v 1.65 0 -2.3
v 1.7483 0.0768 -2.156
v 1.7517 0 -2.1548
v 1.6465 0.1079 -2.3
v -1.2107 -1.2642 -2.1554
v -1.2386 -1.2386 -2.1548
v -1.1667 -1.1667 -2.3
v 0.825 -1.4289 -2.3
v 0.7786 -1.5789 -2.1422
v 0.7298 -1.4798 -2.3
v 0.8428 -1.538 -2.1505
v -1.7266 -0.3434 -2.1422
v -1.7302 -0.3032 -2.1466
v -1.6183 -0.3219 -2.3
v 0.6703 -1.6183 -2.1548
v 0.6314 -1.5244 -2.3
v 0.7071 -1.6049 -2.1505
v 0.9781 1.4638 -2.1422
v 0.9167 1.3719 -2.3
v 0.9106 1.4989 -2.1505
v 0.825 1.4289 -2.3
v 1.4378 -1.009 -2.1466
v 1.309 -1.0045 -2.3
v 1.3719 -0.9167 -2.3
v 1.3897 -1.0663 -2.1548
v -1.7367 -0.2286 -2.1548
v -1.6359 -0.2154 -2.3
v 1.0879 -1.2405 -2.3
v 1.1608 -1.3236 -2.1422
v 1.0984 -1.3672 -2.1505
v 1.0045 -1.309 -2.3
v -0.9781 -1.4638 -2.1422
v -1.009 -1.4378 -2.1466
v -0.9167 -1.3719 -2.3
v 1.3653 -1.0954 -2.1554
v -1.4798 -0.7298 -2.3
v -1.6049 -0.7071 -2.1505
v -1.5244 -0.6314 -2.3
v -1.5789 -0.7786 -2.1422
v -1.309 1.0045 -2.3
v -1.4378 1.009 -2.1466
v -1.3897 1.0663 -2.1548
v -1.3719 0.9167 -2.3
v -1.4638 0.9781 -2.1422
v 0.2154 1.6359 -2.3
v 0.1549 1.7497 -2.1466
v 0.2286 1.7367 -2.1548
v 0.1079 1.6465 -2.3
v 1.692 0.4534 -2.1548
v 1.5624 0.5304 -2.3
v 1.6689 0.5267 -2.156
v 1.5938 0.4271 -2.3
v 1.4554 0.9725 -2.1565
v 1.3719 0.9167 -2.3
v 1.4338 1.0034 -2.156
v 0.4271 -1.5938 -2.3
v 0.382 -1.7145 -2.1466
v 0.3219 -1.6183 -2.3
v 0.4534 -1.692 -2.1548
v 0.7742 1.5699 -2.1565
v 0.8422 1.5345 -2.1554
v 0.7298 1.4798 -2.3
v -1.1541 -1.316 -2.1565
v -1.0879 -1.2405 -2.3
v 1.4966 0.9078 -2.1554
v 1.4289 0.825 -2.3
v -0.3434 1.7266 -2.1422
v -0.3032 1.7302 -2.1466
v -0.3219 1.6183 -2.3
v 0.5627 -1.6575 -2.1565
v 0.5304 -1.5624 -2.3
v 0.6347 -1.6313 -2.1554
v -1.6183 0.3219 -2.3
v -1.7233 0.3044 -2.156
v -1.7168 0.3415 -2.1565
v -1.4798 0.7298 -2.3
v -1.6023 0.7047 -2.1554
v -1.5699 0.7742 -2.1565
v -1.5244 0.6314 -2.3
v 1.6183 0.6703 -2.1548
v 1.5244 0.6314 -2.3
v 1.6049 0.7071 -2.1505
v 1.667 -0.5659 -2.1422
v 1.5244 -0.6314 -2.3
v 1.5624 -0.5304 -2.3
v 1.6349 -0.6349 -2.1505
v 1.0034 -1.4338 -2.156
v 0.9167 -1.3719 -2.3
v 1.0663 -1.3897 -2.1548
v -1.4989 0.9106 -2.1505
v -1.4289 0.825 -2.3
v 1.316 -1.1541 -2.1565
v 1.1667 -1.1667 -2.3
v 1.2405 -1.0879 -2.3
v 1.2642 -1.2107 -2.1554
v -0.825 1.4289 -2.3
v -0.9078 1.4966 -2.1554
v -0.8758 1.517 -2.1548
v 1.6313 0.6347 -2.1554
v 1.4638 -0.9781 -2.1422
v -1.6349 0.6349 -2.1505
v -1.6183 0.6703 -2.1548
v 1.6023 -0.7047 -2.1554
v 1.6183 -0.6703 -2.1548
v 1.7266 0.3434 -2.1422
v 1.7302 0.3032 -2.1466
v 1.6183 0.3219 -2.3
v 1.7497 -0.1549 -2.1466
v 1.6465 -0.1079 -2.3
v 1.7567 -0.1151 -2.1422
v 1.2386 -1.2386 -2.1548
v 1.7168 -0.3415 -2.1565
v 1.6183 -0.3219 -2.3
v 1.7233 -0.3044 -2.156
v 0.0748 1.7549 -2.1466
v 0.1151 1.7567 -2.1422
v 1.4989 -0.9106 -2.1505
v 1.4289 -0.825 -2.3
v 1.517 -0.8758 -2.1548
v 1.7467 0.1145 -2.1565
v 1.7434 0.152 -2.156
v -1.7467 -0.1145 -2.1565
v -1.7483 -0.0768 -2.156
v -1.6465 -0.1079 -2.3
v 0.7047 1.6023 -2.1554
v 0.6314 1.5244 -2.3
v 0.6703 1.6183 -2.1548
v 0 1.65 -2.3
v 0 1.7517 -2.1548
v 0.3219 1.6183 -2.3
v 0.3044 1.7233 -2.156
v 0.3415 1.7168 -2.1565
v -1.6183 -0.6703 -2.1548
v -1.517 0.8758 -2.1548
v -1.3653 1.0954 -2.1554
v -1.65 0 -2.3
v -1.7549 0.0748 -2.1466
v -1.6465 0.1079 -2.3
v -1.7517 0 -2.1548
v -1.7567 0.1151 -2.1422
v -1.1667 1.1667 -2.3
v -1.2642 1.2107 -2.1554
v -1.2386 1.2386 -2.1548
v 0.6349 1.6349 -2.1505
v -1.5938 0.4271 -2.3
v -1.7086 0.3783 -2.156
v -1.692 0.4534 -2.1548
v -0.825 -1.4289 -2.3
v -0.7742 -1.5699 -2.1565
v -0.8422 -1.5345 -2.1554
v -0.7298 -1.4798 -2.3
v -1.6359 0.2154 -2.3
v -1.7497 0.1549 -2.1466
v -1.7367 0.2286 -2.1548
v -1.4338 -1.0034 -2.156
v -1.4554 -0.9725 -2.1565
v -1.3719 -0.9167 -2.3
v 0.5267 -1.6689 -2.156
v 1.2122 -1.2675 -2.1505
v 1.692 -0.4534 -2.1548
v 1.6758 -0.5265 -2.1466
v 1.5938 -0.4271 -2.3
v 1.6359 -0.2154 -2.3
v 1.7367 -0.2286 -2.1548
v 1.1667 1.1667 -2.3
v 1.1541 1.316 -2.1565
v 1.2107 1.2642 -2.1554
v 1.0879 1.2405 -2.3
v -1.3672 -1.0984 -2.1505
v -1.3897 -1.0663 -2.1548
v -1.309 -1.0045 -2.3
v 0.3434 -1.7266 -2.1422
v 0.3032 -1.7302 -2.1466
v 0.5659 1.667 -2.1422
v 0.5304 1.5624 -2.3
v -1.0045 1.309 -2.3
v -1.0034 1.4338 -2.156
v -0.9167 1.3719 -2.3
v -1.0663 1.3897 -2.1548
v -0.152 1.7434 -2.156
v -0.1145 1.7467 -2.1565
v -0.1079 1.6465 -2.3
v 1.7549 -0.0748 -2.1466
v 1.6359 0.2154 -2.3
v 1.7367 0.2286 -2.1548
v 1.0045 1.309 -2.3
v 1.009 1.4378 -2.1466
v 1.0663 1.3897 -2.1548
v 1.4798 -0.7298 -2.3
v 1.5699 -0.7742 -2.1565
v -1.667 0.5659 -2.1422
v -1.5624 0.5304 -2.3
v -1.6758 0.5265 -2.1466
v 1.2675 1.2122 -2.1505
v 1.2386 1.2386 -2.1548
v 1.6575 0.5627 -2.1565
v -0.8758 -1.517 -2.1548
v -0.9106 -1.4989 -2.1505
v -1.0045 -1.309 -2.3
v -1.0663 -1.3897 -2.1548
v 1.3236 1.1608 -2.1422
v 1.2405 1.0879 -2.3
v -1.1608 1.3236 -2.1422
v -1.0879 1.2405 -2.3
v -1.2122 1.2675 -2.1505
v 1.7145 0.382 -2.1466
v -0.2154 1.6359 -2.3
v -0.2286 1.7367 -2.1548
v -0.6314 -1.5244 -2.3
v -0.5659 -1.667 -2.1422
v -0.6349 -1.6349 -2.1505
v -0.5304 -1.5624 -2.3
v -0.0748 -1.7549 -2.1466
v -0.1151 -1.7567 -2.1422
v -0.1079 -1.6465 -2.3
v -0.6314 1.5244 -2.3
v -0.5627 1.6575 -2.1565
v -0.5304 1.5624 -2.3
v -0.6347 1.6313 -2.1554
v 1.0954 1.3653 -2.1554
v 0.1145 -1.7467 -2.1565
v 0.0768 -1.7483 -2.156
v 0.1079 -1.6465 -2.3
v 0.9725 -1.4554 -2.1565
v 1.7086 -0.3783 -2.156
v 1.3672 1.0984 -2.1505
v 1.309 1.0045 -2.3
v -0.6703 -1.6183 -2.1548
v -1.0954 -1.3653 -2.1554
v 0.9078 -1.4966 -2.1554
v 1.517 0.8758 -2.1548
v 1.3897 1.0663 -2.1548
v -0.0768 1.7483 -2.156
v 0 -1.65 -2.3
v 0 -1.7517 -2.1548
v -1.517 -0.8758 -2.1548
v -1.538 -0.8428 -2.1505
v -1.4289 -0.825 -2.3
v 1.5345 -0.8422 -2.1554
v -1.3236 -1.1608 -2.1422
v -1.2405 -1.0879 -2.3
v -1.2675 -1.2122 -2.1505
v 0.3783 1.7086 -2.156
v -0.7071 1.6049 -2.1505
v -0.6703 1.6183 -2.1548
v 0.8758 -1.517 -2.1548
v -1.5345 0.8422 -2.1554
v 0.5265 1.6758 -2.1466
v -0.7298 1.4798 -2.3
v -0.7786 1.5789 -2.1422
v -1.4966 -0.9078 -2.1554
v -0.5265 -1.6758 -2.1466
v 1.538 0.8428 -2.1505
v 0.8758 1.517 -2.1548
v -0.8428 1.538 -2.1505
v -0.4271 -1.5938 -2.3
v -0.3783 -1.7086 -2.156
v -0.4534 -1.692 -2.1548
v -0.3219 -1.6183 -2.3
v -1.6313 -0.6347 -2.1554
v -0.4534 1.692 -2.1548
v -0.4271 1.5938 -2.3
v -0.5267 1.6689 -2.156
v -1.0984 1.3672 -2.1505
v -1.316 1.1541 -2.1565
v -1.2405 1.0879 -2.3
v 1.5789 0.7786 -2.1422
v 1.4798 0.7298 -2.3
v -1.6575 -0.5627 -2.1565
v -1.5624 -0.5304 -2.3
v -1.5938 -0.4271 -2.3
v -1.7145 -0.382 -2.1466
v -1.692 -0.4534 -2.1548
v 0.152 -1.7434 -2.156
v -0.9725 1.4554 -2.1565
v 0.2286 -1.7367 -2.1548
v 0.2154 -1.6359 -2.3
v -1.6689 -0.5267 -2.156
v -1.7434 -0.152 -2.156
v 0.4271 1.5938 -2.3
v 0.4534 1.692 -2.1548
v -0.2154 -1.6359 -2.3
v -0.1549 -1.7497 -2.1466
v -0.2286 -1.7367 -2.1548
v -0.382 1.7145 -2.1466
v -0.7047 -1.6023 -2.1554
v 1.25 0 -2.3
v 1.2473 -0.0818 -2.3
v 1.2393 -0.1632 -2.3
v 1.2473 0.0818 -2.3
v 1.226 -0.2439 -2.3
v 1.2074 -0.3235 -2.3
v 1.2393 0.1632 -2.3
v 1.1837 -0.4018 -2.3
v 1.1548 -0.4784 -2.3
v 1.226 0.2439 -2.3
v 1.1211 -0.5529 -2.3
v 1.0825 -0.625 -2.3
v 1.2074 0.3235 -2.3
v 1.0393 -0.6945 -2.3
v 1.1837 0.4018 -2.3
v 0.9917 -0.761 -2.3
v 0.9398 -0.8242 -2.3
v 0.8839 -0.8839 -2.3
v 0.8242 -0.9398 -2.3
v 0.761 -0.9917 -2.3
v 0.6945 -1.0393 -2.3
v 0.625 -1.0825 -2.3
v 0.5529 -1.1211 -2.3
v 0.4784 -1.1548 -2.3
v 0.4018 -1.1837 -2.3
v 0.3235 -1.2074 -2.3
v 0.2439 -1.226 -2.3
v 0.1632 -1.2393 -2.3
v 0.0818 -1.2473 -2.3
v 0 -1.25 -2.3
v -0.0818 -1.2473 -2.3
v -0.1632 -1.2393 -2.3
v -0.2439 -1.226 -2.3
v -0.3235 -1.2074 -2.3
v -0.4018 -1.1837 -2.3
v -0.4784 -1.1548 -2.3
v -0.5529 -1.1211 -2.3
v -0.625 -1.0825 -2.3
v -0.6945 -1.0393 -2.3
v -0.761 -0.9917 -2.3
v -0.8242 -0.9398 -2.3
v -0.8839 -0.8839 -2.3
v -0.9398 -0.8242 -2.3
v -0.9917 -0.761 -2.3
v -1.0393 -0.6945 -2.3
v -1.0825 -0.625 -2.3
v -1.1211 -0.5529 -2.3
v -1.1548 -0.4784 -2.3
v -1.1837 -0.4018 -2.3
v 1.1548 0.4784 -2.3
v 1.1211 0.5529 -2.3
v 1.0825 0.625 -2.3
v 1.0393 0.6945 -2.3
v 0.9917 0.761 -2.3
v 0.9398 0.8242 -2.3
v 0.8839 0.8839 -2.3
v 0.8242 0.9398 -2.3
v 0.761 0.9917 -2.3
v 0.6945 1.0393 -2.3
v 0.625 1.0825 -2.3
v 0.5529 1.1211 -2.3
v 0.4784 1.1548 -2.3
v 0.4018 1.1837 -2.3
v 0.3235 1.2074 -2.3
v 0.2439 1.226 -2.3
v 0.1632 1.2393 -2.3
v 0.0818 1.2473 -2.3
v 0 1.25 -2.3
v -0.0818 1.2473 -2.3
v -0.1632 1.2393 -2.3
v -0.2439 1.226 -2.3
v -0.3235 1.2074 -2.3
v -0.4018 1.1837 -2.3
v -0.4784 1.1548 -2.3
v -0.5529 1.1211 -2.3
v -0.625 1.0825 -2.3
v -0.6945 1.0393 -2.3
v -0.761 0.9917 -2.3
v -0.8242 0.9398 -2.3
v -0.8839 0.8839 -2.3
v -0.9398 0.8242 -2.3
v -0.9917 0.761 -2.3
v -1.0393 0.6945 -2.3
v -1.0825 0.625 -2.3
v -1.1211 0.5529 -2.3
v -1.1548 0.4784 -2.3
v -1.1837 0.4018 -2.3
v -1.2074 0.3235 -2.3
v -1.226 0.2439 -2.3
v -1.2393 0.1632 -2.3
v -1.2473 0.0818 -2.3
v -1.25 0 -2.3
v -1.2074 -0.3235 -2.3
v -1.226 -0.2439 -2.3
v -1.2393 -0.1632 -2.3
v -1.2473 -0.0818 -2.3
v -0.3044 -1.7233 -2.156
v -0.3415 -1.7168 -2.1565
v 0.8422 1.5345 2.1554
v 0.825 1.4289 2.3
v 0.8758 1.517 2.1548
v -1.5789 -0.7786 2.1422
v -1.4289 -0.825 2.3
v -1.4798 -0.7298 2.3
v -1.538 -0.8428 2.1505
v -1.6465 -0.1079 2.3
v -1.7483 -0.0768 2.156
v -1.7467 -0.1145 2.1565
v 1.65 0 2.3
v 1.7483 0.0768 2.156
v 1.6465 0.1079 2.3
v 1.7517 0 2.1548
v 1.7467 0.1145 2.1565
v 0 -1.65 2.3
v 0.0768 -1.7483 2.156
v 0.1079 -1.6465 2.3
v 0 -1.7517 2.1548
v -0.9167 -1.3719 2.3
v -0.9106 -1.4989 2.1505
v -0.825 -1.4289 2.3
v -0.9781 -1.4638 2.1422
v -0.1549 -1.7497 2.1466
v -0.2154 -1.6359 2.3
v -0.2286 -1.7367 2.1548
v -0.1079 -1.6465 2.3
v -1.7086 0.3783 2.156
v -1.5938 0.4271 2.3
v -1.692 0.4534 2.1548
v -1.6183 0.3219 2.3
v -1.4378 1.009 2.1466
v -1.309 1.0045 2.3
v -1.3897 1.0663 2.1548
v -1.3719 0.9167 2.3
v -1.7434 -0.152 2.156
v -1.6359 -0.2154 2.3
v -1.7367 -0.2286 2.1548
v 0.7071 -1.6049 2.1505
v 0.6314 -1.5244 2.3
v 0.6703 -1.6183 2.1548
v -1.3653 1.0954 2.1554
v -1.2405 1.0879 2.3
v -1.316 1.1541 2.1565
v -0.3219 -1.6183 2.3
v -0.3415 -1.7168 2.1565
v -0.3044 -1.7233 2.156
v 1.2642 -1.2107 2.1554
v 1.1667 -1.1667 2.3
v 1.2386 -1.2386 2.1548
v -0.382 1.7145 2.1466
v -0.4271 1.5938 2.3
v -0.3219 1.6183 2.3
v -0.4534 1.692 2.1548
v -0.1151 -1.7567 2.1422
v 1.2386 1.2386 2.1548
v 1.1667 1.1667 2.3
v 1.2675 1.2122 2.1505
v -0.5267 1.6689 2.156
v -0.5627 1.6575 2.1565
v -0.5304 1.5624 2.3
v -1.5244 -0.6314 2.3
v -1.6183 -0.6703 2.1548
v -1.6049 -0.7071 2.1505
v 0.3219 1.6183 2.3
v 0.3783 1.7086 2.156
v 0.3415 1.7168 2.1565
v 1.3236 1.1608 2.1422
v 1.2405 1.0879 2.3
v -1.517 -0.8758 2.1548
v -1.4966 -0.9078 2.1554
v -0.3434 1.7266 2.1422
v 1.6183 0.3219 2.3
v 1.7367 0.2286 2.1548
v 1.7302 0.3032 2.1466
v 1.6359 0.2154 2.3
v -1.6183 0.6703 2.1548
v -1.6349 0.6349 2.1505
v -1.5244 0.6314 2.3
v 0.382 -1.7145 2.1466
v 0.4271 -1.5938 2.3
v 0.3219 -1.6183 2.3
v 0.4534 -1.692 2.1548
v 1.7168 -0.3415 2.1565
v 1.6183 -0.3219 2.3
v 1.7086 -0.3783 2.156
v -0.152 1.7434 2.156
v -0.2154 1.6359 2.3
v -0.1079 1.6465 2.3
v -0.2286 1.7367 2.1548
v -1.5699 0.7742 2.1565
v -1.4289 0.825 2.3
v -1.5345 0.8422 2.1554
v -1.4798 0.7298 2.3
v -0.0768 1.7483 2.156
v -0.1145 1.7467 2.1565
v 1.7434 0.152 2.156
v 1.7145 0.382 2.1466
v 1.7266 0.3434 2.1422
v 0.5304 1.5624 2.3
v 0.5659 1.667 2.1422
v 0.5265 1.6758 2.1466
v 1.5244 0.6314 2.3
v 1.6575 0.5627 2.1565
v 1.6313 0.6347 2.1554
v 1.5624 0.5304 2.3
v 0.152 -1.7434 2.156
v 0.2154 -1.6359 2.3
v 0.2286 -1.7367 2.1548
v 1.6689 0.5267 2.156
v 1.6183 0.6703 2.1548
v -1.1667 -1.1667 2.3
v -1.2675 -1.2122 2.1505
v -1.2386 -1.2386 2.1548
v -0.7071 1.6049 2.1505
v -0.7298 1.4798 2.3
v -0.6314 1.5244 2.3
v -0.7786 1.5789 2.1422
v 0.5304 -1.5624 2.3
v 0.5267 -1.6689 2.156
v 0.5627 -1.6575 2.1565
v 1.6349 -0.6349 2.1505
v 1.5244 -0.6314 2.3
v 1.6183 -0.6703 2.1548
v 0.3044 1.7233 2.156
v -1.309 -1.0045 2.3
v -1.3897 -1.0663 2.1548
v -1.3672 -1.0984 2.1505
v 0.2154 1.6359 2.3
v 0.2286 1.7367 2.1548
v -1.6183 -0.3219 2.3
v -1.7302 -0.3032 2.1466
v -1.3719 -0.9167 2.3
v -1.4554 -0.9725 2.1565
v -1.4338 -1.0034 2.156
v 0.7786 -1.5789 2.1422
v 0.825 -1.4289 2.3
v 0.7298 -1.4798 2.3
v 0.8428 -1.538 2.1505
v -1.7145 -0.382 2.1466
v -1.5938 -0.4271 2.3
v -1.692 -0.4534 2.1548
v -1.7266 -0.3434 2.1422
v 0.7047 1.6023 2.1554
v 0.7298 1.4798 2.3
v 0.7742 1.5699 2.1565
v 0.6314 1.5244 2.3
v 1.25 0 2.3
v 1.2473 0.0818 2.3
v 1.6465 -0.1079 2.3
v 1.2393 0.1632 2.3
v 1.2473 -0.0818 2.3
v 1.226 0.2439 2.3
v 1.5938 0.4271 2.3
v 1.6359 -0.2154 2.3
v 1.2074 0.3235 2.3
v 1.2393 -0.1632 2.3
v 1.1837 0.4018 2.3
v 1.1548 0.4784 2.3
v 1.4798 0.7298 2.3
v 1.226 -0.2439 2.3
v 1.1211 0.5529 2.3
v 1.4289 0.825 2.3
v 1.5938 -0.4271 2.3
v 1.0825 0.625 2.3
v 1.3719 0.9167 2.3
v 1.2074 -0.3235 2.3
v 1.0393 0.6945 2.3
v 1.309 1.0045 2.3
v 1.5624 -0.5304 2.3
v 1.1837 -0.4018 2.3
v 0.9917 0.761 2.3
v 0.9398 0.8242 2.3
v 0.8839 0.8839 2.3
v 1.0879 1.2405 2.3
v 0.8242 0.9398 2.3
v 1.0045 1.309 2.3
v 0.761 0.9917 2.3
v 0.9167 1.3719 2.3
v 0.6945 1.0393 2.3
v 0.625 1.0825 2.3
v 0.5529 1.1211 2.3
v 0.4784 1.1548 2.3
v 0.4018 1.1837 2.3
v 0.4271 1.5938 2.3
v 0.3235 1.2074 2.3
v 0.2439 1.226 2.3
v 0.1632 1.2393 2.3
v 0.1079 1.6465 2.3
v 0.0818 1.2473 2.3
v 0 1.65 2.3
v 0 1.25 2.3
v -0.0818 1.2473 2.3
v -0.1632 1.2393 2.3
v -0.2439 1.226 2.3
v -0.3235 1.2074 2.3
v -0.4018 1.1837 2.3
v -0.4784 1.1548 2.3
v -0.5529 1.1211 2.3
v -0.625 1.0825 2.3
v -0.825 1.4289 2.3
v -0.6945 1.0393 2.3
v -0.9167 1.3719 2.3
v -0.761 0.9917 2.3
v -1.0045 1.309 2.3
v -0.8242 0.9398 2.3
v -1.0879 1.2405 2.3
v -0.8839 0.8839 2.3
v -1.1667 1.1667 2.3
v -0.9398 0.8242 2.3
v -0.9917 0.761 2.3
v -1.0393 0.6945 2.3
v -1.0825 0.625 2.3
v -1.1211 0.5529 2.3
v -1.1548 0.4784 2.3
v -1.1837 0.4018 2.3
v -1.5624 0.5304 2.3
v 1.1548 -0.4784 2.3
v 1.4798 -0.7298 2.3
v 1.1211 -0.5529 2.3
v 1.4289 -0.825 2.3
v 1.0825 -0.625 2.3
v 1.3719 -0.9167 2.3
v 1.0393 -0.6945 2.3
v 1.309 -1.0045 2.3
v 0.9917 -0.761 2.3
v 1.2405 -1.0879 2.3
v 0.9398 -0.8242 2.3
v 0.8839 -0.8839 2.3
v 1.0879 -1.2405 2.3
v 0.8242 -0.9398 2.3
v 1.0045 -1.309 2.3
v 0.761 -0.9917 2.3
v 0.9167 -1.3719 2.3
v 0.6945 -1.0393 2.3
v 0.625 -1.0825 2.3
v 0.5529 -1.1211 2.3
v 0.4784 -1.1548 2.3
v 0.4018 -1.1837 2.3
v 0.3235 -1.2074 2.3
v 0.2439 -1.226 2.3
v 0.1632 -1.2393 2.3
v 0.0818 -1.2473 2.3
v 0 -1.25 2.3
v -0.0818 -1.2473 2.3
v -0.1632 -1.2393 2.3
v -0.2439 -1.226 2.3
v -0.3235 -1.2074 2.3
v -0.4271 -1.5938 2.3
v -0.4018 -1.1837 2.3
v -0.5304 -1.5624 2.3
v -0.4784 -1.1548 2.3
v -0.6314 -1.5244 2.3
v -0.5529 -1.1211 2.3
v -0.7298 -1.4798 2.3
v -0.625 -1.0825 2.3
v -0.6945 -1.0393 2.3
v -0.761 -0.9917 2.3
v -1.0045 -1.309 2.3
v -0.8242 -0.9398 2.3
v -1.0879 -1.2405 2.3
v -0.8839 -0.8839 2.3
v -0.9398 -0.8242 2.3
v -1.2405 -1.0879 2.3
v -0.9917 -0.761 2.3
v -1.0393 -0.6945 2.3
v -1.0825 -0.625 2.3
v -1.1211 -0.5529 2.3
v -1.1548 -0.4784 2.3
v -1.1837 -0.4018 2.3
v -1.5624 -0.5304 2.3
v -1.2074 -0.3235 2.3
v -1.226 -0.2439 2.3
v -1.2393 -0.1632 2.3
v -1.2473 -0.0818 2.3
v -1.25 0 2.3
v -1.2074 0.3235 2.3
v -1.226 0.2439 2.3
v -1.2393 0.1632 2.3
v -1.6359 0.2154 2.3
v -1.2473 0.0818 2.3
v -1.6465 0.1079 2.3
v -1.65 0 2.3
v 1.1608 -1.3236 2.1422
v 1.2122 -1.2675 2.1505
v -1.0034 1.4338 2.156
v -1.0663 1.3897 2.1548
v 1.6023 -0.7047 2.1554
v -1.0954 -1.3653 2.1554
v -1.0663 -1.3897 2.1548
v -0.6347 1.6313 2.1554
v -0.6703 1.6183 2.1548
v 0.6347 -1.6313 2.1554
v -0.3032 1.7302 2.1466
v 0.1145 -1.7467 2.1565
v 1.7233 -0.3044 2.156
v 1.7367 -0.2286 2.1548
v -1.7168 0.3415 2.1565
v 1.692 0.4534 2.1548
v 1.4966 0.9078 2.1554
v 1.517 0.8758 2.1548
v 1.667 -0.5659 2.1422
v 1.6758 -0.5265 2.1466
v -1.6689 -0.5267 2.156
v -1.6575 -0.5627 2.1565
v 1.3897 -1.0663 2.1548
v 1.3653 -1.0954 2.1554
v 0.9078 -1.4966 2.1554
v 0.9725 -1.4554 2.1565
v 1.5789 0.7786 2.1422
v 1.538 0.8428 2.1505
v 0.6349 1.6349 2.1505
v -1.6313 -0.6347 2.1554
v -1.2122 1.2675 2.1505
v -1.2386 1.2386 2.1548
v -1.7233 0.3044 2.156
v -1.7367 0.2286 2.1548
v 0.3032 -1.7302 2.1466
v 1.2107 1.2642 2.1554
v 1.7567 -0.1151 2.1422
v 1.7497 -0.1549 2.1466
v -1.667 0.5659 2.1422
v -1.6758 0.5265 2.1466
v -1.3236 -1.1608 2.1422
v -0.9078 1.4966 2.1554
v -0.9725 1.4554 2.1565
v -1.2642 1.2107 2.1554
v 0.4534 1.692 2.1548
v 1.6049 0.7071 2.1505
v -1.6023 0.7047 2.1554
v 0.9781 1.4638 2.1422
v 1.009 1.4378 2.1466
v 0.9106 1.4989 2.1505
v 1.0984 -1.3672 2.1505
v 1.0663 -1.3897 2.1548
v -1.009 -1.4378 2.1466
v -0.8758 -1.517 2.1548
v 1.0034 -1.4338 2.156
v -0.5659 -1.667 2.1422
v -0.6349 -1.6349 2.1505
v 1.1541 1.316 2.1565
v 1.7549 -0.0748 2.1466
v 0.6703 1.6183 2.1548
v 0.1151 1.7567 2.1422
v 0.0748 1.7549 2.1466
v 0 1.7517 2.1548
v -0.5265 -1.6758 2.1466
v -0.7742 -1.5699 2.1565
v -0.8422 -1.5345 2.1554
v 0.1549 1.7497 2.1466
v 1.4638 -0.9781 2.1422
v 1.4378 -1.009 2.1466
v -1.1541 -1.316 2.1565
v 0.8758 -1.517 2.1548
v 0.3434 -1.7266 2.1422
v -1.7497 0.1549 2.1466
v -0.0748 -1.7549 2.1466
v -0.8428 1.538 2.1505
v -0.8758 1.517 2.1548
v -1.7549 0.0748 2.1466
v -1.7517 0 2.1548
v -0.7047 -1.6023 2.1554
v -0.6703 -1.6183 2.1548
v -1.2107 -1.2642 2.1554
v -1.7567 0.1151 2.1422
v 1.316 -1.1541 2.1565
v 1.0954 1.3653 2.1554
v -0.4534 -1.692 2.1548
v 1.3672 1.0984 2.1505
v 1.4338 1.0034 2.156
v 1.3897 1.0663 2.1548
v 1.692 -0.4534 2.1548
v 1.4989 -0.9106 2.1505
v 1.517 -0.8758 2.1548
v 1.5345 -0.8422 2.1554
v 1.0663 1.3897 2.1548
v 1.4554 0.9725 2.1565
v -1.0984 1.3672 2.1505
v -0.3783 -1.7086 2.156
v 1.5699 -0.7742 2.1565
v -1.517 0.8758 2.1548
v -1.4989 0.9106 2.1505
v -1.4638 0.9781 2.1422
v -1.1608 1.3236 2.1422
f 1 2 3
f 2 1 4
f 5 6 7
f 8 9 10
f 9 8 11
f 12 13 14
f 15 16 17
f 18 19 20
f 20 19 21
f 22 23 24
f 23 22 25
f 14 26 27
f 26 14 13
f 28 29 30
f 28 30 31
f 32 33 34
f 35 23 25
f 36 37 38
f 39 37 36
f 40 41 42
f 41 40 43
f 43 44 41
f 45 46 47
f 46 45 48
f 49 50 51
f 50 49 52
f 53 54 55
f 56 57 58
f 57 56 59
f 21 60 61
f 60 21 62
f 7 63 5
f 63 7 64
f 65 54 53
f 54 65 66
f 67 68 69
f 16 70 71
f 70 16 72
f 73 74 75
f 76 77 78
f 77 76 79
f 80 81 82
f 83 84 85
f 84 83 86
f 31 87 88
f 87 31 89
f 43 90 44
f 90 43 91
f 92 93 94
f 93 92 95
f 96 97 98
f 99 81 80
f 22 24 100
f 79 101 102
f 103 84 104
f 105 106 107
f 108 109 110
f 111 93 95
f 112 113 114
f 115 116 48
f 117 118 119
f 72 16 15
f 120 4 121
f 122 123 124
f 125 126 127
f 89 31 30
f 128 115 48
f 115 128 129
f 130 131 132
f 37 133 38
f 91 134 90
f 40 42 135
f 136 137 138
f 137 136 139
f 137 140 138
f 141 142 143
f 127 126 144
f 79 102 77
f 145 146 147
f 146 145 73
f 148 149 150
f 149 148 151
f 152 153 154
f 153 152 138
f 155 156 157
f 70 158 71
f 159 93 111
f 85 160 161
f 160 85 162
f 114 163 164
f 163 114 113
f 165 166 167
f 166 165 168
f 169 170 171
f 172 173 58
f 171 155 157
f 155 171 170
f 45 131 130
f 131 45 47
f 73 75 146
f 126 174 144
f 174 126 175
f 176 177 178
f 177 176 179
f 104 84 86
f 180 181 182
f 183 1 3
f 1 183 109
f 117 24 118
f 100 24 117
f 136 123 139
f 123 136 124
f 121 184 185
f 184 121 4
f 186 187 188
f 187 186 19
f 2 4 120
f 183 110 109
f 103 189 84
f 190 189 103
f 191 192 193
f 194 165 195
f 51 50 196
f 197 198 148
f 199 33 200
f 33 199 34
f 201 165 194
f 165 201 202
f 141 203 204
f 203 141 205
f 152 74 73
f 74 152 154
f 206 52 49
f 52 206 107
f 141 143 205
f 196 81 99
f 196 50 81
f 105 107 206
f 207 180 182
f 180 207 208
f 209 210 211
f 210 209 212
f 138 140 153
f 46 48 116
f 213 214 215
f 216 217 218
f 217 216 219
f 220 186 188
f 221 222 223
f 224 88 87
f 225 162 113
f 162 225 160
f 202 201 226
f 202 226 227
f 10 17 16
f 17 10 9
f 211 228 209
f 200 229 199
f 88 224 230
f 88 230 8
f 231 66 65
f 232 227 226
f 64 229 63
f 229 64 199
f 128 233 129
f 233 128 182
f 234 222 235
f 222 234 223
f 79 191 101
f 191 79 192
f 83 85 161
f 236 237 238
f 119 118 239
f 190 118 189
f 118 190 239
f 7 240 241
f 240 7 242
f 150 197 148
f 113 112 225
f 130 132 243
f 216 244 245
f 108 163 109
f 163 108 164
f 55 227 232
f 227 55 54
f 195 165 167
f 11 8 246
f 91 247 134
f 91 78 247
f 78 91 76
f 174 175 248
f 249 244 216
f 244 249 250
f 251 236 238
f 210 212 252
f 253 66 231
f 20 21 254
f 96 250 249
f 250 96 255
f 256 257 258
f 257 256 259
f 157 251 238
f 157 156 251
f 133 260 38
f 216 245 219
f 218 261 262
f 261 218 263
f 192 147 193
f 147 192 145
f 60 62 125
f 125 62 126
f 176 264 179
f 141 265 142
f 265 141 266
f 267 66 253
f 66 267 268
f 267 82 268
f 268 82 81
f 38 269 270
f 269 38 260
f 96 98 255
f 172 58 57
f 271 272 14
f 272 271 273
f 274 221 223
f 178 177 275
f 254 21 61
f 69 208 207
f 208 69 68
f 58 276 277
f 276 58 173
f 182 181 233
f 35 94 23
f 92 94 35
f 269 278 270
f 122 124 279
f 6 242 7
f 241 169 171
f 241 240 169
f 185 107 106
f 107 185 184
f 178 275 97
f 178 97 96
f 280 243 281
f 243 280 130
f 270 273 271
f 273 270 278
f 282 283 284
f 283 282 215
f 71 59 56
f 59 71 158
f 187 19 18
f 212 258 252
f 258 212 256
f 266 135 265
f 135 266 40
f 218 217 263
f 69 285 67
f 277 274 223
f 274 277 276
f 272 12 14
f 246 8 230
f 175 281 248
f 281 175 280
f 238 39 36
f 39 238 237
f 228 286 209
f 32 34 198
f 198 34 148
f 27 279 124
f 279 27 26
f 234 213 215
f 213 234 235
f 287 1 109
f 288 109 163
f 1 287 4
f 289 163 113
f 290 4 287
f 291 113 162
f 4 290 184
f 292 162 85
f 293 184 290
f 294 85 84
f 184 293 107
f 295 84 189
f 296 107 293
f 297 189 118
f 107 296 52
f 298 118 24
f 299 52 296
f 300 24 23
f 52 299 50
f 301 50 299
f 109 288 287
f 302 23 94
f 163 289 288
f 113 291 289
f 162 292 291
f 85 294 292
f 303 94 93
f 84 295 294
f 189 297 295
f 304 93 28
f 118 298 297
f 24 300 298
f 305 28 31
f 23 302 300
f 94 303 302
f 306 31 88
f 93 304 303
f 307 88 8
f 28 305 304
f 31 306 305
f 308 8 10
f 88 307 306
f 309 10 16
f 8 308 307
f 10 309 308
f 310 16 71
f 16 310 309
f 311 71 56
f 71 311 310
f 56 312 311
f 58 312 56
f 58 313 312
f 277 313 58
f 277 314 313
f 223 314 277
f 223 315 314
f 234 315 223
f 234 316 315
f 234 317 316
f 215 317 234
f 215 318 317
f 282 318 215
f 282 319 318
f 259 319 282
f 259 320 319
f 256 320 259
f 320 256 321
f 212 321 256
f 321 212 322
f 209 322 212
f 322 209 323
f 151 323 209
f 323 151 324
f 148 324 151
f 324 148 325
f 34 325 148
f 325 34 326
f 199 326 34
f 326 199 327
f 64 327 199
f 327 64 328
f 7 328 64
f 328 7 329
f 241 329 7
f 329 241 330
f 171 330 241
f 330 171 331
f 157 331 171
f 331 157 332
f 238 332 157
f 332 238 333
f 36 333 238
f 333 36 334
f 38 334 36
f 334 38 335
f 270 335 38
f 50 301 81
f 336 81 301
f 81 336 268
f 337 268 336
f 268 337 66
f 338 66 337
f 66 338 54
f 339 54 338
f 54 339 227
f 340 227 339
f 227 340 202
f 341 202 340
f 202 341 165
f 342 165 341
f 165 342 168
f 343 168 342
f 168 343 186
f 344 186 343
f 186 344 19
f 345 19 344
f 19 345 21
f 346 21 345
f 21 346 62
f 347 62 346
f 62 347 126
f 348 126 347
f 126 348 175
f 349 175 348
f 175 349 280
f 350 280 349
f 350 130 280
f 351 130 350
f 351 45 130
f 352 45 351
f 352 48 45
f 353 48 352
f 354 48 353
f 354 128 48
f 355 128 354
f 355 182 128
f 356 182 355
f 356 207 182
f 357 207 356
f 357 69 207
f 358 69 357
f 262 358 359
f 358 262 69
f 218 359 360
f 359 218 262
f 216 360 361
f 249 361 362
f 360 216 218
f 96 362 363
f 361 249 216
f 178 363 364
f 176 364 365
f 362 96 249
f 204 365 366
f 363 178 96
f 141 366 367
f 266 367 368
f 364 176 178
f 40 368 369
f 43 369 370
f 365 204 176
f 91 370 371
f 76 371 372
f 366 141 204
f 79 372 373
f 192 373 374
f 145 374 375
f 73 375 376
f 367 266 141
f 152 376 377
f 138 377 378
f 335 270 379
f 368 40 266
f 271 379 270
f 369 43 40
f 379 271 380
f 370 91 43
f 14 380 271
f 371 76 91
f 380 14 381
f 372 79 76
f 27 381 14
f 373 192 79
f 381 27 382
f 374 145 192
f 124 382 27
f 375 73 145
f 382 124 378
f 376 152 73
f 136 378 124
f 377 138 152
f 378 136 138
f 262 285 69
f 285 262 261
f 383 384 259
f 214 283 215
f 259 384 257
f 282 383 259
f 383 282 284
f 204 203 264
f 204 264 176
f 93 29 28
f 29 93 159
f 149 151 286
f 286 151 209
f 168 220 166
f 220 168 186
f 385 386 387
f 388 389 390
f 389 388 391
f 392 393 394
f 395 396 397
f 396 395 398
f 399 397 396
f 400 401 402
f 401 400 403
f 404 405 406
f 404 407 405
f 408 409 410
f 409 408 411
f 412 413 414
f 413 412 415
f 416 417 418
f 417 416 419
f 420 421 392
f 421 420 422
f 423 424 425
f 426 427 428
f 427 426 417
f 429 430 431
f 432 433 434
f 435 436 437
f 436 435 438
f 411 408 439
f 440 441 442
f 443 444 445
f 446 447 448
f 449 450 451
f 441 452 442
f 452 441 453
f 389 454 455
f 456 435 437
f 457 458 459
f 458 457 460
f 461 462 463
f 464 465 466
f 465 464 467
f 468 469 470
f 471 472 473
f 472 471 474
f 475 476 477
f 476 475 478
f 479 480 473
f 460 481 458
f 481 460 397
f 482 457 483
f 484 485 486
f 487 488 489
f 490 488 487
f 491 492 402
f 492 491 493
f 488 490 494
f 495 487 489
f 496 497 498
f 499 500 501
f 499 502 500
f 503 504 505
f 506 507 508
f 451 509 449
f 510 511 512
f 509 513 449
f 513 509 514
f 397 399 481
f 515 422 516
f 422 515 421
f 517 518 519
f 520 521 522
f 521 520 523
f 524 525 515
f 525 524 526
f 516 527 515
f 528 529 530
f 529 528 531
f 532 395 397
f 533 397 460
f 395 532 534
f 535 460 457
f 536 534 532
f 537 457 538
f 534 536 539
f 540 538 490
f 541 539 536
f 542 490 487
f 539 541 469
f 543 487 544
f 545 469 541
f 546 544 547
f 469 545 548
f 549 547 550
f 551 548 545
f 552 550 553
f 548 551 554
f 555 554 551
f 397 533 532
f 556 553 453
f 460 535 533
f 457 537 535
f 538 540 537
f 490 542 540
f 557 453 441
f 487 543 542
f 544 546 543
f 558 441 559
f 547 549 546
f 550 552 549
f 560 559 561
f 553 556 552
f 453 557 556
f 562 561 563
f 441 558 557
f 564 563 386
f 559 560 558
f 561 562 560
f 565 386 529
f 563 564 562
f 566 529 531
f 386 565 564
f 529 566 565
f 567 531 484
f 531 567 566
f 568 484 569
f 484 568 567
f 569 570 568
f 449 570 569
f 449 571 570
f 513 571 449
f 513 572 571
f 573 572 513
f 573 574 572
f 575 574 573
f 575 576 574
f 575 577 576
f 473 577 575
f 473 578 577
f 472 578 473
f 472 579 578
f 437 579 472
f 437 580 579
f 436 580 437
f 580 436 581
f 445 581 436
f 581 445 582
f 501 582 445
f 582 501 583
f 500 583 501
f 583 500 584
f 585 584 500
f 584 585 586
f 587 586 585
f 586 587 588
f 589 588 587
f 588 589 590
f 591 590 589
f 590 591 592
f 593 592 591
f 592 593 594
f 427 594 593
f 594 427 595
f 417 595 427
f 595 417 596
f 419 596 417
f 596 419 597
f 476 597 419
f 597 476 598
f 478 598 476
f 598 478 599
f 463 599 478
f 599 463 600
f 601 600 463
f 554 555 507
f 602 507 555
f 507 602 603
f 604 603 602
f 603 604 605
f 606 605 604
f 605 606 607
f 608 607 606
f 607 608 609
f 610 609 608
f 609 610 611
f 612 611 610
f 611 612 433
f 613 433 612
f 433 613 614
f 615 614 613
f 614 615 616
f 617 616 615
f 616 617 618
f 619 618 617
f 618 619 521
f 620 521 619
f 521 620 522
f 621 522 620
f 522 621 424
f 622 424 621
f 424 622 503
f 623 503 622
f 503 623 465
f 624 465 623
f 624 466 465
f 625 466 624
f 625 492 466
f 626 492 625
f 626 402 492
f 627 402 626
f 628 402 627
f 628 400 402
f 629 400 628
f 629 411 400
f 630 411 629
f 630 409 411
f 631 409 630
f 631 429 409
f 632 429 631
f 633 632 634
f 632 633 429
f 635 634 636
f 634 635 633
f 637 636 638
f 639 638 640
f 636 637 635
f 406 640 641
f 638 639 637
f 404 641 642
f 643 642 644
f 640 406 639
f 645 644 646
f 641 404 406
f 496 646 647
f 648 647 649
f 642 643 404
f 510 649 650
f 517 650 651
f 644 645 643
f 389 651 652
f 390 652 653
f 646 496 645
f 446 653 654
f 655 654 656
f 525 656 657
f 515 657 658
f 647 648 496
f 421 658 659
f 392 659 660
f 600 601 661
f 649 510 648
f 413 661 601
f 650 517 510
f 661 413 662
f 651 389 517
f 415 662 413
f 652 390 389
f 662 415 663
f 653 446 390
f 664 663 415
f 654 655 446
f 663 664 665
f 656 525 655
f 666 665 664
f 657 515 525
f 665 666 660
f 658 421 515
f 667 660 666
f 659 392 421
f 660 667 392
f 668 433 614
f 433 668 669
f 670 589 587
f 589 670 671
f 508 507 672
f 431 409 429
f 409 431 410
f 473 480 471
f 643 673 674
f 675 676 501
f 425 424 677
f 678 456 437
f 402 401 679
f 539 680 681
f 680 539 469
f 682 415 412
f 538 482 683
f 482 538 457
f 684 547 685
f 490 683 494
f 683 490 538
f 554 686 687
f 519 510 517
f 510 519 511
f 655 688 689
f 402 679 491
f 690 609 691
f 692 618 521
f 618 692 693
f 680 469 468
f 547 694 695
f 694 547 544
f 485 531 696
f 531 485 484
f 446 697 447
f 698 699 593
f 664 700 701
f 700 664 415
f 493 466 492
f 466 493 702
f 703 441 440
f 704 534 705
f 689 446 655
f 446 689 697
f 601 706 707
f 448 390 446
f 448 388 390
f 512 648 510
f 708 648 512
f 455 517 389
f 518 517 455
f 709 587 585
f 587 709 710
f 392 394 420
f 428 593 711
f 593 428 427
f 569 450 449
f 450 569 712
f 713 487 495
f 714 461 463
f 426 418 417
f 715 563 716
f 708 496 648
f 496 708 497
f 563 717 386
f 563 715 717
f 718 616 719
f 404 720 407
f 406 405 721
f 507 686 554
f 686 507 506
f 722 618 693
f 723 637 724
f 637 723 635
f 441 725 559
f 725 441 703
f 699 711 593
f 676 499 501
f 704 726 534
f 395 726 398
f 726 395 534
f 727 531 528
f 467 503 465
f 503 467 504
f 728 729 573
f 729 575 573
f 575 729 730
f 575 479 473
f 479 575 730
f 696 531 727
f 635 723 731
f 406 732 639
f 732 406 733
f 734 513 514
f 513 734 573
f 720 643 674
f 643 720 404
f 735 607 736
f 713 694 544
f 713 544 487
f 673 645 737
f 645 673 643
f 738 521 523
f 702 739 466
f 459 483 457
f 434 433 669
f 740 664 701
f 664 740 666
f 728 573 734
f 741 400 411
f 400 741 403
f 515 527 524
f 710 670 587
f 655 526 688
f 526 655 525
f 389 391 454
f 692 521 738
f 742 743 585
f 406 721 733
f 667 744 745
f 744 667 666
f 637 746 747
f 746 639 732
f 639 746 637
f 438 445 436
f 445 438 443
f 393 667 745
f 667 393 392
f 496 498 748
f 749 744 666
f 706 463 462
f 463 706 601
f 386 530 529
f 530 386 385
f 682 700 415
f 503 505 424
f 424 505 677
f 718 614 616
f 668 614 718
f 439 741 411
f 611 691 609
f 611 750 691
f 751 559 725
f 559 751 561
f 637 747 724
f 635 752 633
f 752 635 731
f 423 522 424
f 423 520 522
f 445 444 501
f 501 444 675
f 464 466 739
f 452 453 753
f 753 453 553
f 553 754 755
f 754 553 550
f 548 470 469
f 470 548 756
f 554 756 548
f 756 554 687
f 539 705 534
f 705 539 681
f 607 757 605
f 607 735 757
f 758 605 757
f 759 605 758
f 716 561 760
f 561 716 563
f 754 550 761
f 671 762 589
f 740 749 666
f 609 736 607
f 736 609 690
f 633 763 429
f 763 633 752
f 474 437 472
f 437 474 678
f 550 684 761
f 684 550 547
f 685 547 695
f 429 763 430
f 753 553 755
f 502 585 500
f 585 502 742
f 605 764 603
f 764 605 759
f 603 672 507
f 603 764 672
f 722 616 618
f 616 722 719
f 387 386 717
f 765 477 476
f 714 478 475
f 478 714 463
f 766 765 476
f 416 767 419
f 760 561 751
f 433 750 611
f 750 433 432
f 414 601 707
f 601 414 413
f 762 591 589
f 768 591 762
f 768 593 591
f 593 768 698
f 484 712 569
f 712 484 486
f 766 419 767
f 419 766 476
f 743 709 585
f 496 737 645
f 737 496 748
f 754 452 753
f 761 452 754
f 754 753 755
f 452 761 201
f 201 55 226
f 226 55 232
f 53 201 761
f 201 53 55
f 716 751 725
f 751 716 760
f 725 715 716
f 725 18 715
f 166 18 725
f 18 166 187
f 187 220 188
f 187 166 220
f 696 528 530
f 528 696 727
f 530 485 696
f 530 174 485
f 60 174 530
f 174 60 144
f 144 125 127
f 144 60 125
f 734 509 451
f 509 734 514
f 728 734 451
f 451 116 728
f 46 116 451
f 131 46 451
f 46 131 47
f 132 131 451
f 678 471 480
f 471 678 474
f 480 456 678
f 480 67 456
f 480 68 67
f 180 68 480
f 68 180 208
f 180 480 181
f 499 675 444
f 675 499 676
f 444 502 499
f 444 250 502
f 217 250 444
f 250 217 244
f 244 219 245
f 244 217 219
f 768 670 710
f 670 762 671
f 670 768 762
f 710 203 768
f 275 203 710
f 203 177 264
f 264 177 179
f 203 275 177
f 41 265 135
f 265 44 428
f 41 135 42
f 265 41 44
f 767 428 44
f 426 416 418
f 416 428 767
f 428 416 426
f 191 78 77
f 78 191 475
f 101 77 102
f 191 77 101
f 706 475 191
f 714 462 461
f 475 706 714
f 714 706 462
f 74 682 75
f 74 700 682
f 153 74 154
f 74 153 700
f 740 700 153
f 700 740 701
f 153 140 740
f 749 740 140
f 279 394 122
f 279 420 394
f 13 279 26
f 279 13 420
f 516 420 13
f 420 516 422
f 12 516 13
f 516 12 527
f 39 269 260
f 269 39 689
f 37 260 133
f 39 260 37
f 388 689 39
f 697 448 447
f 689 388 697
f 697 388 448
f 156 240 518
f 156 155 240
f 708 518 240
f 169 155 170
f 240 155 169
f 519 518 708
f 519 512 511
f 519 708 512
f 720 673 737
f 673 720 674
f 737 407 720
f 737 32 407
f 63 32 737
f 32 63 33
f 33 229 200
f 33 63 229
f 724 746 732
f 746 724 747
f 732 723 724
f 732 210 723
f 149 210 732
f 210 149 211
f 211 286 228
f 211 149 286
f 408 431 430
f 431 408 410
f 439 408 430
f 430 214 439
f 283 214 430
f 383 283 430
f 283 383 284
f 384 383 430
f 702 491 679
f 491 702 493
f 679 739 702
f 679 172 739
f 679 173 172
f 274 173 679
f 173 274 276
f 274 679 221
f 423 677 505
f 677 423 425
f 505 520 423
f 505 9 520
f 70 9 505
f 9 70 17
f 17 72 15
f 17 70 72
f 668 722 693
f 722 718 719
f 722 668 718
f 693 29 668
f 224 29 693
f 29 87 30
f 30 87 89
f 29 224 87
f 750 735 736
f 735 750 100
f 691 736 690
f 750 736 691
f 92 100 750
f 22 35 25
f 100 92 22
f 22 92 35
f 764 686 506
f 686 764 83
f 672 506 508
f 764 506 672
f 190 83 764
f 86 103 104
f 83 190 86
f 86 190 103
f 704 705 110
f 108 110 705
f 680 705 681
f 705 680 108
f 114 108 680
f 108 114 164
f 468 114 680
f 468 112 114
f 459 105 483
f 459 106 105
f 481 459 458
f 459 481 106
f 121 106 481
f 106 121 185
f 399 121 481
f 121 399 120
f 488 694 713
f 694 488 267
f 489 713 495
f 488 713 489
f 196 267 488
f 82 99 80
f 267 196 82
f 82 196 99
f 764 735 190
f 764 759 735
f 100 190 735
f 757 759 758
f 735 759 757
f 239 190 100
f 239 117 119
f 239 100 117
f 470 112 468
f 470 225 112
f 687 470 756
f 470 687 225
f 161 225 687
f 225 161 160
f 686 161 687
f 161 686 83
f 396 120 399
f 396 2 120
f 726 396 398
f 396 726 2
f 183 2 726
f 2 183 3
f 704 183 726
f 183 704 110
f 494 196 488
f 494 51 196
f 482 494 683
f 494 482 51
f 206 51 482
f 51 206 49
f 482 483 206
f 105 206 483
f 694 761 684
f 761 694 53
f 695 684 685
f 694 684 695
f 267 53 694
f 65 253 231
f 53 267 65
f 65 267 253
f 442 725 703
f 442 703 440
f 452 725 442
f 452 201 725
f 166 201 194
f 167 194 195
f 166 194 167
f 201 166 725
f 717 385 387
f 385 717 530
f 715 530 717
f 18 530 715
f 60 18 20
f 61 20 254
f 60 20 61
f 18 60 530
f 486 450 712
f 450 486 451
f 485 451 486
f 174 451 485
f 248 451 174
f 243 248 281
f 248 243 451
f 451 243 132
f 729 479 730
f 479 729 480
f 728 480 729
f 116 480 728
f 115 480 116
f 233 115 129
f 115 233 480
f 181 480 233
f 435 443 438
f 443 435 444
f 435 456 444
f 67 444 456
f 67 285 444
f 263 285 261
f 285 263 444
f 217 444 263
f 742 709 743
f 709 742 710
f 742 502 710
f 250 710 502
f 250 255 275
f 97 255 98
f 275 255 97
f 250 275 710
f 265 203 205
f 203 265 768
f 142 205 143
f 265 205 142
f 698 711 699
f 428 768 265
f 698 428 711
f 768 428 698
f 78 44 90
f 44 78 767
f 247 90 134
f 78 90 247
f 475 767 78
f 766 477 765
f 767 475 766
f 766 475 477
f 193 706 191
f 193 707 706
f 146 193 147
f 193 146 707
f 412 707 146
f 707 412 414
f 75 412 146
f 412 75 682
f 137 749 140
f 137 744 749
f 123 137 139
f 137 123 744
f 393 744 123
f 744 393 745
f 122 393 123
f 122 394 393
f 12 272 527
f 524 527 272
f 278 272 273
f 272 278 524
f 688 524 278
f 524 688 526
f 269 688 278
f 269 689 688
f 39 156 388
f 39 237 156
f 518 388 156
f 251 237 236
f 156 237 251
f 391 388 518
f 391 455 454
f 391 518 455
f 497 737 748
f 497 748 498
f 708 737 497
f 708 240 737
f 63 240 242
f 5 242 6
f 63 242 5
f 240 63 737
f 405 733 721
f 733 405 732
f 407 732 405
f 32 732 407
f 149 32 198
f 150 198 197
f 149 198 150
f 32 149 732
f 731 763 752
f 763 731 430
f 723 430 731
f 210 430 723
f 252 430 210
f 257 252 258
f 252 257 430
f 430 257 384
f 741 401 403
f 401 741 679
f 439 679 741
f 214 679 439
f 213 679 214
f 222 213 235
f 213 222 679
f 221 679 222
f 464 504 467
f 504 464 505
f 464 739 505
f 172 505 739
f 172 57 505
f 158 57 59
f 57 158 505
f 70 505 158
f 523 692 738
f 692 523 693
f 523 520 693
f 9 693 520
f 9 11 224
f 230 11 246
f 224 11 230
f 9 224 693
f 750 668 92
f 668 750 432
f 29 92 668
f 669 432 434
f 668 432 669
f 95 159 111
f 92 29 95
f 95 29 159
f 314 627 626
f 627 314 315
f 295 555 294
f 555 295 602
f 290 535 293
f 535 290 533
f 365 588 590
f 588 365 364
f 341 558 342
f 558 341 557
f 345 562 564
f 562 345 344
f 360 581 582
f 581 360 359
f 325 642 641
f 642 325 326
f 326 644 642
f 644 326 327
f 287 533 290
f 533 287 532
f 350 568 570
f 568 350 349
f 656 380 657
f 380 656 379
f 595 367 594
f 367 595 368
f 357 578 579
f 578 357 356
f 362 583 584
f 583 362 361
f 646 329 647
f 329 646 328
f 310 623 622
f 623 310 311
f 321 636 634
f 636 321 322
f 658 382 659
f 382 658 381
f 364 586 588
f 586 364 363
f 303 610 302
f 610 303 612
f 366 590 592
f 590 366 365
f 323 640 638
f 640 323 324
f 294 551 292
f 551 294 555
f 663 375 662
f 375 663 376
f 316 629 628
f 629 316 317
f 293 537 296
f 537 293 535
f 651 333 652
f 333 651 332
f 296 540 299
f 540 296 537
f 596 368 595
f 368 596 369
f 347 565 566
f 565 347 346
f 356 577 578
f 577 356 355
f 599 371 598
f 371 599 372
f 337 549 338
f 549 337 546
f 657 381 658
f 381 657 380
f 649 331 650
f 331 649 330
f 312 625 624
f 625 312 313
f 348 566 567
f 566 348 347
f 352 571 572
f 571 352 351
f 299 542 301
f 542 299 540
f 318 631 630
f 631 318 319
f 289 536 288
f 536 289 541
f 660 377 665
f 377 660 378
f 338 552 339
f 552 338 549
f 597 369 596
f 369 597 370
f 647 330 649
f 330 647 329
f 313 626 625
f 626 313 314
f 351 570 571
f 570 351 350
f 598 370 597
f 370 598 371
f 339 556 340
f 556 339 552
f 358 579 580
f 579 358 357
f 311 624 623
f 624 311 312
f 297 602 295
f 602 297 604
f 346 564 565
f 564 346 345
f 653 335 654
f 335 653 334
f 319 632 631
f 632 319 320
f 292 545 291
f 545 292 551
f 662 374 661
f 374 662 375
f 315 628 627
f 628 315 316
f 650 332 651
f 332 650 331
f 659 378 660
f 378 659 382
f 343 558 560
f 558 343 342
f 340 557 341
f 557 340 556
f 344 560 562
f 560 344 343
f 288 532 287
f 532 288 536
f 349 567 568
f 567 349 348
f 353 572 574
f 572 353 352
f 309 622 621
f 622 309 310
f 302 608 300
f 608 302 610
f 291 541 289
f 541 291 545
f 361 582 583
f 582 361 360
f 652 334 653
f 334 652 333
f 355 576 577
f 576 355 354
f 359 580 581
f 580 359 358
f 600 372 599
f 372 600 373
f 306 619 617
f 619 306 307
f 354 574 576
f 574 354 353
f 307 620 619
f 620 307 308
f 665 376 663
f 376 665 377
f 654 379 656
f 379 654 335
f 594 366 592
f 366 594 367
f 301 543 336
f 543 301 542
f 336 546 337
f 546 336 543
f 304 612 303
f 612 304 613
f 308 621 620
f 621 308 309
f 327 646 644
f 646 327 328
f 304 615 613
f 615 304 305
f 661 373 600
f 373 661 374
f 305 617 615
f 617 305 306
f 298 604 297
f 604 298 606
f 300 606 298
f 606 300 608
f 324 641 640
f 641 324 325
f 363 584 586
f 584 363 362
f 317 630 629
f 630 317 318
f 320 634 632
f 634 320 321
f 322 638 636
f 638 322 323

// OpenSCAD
$fn=96;

od = 4.0;
len = 4.6;
id = 2.5;

knurl_depth = 0.25;
knurl_count = 24;
knurl_twist_deg = 35;

chamfer_h = 0.5;
chamfer_r = 0.35;

module chamfered_cylinder(h, r, ch_h, ch_r) {
    union() {
        translate([0,0,-h/2 + ch_h])
            cylinder(h=h-2*ch_h, r=r, center=false);
        translate([0,0,-h/2])
            cylinder(h=ch_h, r1=r-ch_r, r2=r, center=false);
        translate([0,0,h/2 - ch_h])
            cylinder(h=ch_h, r1=r, r2=r-ch_r, center=false);
    }
}

module knurl_cutters(h, r, depth, n, twist_deg) {
    for (i = [0:n-1]) {
        rotate([0,0, i*360/n])
            rotate([0,0, twist_deg])
                translate([r - depth/2, 0, 0])
                    cube([depth, 0.9, h+0.6], center=true);
    }
}

module heat_set_insert(od, len, id) {
    r = od/2;
    difference() {
        chamfered_cylinder(len, r, chamfer_h, chamfer_r);
        cylinder(h=len+1, r=id/2, center=true);
        knurl_cutters(len, r, knurl_depth, knurl_count, knurl_twist_deg);
        rotate([0,0,180/knurl_count])
            knurl_cutters(len, r, knurl_depth, knurl_count, -knurl_twist_deg);
    }
}

heat_set_insert(od, len, id);
